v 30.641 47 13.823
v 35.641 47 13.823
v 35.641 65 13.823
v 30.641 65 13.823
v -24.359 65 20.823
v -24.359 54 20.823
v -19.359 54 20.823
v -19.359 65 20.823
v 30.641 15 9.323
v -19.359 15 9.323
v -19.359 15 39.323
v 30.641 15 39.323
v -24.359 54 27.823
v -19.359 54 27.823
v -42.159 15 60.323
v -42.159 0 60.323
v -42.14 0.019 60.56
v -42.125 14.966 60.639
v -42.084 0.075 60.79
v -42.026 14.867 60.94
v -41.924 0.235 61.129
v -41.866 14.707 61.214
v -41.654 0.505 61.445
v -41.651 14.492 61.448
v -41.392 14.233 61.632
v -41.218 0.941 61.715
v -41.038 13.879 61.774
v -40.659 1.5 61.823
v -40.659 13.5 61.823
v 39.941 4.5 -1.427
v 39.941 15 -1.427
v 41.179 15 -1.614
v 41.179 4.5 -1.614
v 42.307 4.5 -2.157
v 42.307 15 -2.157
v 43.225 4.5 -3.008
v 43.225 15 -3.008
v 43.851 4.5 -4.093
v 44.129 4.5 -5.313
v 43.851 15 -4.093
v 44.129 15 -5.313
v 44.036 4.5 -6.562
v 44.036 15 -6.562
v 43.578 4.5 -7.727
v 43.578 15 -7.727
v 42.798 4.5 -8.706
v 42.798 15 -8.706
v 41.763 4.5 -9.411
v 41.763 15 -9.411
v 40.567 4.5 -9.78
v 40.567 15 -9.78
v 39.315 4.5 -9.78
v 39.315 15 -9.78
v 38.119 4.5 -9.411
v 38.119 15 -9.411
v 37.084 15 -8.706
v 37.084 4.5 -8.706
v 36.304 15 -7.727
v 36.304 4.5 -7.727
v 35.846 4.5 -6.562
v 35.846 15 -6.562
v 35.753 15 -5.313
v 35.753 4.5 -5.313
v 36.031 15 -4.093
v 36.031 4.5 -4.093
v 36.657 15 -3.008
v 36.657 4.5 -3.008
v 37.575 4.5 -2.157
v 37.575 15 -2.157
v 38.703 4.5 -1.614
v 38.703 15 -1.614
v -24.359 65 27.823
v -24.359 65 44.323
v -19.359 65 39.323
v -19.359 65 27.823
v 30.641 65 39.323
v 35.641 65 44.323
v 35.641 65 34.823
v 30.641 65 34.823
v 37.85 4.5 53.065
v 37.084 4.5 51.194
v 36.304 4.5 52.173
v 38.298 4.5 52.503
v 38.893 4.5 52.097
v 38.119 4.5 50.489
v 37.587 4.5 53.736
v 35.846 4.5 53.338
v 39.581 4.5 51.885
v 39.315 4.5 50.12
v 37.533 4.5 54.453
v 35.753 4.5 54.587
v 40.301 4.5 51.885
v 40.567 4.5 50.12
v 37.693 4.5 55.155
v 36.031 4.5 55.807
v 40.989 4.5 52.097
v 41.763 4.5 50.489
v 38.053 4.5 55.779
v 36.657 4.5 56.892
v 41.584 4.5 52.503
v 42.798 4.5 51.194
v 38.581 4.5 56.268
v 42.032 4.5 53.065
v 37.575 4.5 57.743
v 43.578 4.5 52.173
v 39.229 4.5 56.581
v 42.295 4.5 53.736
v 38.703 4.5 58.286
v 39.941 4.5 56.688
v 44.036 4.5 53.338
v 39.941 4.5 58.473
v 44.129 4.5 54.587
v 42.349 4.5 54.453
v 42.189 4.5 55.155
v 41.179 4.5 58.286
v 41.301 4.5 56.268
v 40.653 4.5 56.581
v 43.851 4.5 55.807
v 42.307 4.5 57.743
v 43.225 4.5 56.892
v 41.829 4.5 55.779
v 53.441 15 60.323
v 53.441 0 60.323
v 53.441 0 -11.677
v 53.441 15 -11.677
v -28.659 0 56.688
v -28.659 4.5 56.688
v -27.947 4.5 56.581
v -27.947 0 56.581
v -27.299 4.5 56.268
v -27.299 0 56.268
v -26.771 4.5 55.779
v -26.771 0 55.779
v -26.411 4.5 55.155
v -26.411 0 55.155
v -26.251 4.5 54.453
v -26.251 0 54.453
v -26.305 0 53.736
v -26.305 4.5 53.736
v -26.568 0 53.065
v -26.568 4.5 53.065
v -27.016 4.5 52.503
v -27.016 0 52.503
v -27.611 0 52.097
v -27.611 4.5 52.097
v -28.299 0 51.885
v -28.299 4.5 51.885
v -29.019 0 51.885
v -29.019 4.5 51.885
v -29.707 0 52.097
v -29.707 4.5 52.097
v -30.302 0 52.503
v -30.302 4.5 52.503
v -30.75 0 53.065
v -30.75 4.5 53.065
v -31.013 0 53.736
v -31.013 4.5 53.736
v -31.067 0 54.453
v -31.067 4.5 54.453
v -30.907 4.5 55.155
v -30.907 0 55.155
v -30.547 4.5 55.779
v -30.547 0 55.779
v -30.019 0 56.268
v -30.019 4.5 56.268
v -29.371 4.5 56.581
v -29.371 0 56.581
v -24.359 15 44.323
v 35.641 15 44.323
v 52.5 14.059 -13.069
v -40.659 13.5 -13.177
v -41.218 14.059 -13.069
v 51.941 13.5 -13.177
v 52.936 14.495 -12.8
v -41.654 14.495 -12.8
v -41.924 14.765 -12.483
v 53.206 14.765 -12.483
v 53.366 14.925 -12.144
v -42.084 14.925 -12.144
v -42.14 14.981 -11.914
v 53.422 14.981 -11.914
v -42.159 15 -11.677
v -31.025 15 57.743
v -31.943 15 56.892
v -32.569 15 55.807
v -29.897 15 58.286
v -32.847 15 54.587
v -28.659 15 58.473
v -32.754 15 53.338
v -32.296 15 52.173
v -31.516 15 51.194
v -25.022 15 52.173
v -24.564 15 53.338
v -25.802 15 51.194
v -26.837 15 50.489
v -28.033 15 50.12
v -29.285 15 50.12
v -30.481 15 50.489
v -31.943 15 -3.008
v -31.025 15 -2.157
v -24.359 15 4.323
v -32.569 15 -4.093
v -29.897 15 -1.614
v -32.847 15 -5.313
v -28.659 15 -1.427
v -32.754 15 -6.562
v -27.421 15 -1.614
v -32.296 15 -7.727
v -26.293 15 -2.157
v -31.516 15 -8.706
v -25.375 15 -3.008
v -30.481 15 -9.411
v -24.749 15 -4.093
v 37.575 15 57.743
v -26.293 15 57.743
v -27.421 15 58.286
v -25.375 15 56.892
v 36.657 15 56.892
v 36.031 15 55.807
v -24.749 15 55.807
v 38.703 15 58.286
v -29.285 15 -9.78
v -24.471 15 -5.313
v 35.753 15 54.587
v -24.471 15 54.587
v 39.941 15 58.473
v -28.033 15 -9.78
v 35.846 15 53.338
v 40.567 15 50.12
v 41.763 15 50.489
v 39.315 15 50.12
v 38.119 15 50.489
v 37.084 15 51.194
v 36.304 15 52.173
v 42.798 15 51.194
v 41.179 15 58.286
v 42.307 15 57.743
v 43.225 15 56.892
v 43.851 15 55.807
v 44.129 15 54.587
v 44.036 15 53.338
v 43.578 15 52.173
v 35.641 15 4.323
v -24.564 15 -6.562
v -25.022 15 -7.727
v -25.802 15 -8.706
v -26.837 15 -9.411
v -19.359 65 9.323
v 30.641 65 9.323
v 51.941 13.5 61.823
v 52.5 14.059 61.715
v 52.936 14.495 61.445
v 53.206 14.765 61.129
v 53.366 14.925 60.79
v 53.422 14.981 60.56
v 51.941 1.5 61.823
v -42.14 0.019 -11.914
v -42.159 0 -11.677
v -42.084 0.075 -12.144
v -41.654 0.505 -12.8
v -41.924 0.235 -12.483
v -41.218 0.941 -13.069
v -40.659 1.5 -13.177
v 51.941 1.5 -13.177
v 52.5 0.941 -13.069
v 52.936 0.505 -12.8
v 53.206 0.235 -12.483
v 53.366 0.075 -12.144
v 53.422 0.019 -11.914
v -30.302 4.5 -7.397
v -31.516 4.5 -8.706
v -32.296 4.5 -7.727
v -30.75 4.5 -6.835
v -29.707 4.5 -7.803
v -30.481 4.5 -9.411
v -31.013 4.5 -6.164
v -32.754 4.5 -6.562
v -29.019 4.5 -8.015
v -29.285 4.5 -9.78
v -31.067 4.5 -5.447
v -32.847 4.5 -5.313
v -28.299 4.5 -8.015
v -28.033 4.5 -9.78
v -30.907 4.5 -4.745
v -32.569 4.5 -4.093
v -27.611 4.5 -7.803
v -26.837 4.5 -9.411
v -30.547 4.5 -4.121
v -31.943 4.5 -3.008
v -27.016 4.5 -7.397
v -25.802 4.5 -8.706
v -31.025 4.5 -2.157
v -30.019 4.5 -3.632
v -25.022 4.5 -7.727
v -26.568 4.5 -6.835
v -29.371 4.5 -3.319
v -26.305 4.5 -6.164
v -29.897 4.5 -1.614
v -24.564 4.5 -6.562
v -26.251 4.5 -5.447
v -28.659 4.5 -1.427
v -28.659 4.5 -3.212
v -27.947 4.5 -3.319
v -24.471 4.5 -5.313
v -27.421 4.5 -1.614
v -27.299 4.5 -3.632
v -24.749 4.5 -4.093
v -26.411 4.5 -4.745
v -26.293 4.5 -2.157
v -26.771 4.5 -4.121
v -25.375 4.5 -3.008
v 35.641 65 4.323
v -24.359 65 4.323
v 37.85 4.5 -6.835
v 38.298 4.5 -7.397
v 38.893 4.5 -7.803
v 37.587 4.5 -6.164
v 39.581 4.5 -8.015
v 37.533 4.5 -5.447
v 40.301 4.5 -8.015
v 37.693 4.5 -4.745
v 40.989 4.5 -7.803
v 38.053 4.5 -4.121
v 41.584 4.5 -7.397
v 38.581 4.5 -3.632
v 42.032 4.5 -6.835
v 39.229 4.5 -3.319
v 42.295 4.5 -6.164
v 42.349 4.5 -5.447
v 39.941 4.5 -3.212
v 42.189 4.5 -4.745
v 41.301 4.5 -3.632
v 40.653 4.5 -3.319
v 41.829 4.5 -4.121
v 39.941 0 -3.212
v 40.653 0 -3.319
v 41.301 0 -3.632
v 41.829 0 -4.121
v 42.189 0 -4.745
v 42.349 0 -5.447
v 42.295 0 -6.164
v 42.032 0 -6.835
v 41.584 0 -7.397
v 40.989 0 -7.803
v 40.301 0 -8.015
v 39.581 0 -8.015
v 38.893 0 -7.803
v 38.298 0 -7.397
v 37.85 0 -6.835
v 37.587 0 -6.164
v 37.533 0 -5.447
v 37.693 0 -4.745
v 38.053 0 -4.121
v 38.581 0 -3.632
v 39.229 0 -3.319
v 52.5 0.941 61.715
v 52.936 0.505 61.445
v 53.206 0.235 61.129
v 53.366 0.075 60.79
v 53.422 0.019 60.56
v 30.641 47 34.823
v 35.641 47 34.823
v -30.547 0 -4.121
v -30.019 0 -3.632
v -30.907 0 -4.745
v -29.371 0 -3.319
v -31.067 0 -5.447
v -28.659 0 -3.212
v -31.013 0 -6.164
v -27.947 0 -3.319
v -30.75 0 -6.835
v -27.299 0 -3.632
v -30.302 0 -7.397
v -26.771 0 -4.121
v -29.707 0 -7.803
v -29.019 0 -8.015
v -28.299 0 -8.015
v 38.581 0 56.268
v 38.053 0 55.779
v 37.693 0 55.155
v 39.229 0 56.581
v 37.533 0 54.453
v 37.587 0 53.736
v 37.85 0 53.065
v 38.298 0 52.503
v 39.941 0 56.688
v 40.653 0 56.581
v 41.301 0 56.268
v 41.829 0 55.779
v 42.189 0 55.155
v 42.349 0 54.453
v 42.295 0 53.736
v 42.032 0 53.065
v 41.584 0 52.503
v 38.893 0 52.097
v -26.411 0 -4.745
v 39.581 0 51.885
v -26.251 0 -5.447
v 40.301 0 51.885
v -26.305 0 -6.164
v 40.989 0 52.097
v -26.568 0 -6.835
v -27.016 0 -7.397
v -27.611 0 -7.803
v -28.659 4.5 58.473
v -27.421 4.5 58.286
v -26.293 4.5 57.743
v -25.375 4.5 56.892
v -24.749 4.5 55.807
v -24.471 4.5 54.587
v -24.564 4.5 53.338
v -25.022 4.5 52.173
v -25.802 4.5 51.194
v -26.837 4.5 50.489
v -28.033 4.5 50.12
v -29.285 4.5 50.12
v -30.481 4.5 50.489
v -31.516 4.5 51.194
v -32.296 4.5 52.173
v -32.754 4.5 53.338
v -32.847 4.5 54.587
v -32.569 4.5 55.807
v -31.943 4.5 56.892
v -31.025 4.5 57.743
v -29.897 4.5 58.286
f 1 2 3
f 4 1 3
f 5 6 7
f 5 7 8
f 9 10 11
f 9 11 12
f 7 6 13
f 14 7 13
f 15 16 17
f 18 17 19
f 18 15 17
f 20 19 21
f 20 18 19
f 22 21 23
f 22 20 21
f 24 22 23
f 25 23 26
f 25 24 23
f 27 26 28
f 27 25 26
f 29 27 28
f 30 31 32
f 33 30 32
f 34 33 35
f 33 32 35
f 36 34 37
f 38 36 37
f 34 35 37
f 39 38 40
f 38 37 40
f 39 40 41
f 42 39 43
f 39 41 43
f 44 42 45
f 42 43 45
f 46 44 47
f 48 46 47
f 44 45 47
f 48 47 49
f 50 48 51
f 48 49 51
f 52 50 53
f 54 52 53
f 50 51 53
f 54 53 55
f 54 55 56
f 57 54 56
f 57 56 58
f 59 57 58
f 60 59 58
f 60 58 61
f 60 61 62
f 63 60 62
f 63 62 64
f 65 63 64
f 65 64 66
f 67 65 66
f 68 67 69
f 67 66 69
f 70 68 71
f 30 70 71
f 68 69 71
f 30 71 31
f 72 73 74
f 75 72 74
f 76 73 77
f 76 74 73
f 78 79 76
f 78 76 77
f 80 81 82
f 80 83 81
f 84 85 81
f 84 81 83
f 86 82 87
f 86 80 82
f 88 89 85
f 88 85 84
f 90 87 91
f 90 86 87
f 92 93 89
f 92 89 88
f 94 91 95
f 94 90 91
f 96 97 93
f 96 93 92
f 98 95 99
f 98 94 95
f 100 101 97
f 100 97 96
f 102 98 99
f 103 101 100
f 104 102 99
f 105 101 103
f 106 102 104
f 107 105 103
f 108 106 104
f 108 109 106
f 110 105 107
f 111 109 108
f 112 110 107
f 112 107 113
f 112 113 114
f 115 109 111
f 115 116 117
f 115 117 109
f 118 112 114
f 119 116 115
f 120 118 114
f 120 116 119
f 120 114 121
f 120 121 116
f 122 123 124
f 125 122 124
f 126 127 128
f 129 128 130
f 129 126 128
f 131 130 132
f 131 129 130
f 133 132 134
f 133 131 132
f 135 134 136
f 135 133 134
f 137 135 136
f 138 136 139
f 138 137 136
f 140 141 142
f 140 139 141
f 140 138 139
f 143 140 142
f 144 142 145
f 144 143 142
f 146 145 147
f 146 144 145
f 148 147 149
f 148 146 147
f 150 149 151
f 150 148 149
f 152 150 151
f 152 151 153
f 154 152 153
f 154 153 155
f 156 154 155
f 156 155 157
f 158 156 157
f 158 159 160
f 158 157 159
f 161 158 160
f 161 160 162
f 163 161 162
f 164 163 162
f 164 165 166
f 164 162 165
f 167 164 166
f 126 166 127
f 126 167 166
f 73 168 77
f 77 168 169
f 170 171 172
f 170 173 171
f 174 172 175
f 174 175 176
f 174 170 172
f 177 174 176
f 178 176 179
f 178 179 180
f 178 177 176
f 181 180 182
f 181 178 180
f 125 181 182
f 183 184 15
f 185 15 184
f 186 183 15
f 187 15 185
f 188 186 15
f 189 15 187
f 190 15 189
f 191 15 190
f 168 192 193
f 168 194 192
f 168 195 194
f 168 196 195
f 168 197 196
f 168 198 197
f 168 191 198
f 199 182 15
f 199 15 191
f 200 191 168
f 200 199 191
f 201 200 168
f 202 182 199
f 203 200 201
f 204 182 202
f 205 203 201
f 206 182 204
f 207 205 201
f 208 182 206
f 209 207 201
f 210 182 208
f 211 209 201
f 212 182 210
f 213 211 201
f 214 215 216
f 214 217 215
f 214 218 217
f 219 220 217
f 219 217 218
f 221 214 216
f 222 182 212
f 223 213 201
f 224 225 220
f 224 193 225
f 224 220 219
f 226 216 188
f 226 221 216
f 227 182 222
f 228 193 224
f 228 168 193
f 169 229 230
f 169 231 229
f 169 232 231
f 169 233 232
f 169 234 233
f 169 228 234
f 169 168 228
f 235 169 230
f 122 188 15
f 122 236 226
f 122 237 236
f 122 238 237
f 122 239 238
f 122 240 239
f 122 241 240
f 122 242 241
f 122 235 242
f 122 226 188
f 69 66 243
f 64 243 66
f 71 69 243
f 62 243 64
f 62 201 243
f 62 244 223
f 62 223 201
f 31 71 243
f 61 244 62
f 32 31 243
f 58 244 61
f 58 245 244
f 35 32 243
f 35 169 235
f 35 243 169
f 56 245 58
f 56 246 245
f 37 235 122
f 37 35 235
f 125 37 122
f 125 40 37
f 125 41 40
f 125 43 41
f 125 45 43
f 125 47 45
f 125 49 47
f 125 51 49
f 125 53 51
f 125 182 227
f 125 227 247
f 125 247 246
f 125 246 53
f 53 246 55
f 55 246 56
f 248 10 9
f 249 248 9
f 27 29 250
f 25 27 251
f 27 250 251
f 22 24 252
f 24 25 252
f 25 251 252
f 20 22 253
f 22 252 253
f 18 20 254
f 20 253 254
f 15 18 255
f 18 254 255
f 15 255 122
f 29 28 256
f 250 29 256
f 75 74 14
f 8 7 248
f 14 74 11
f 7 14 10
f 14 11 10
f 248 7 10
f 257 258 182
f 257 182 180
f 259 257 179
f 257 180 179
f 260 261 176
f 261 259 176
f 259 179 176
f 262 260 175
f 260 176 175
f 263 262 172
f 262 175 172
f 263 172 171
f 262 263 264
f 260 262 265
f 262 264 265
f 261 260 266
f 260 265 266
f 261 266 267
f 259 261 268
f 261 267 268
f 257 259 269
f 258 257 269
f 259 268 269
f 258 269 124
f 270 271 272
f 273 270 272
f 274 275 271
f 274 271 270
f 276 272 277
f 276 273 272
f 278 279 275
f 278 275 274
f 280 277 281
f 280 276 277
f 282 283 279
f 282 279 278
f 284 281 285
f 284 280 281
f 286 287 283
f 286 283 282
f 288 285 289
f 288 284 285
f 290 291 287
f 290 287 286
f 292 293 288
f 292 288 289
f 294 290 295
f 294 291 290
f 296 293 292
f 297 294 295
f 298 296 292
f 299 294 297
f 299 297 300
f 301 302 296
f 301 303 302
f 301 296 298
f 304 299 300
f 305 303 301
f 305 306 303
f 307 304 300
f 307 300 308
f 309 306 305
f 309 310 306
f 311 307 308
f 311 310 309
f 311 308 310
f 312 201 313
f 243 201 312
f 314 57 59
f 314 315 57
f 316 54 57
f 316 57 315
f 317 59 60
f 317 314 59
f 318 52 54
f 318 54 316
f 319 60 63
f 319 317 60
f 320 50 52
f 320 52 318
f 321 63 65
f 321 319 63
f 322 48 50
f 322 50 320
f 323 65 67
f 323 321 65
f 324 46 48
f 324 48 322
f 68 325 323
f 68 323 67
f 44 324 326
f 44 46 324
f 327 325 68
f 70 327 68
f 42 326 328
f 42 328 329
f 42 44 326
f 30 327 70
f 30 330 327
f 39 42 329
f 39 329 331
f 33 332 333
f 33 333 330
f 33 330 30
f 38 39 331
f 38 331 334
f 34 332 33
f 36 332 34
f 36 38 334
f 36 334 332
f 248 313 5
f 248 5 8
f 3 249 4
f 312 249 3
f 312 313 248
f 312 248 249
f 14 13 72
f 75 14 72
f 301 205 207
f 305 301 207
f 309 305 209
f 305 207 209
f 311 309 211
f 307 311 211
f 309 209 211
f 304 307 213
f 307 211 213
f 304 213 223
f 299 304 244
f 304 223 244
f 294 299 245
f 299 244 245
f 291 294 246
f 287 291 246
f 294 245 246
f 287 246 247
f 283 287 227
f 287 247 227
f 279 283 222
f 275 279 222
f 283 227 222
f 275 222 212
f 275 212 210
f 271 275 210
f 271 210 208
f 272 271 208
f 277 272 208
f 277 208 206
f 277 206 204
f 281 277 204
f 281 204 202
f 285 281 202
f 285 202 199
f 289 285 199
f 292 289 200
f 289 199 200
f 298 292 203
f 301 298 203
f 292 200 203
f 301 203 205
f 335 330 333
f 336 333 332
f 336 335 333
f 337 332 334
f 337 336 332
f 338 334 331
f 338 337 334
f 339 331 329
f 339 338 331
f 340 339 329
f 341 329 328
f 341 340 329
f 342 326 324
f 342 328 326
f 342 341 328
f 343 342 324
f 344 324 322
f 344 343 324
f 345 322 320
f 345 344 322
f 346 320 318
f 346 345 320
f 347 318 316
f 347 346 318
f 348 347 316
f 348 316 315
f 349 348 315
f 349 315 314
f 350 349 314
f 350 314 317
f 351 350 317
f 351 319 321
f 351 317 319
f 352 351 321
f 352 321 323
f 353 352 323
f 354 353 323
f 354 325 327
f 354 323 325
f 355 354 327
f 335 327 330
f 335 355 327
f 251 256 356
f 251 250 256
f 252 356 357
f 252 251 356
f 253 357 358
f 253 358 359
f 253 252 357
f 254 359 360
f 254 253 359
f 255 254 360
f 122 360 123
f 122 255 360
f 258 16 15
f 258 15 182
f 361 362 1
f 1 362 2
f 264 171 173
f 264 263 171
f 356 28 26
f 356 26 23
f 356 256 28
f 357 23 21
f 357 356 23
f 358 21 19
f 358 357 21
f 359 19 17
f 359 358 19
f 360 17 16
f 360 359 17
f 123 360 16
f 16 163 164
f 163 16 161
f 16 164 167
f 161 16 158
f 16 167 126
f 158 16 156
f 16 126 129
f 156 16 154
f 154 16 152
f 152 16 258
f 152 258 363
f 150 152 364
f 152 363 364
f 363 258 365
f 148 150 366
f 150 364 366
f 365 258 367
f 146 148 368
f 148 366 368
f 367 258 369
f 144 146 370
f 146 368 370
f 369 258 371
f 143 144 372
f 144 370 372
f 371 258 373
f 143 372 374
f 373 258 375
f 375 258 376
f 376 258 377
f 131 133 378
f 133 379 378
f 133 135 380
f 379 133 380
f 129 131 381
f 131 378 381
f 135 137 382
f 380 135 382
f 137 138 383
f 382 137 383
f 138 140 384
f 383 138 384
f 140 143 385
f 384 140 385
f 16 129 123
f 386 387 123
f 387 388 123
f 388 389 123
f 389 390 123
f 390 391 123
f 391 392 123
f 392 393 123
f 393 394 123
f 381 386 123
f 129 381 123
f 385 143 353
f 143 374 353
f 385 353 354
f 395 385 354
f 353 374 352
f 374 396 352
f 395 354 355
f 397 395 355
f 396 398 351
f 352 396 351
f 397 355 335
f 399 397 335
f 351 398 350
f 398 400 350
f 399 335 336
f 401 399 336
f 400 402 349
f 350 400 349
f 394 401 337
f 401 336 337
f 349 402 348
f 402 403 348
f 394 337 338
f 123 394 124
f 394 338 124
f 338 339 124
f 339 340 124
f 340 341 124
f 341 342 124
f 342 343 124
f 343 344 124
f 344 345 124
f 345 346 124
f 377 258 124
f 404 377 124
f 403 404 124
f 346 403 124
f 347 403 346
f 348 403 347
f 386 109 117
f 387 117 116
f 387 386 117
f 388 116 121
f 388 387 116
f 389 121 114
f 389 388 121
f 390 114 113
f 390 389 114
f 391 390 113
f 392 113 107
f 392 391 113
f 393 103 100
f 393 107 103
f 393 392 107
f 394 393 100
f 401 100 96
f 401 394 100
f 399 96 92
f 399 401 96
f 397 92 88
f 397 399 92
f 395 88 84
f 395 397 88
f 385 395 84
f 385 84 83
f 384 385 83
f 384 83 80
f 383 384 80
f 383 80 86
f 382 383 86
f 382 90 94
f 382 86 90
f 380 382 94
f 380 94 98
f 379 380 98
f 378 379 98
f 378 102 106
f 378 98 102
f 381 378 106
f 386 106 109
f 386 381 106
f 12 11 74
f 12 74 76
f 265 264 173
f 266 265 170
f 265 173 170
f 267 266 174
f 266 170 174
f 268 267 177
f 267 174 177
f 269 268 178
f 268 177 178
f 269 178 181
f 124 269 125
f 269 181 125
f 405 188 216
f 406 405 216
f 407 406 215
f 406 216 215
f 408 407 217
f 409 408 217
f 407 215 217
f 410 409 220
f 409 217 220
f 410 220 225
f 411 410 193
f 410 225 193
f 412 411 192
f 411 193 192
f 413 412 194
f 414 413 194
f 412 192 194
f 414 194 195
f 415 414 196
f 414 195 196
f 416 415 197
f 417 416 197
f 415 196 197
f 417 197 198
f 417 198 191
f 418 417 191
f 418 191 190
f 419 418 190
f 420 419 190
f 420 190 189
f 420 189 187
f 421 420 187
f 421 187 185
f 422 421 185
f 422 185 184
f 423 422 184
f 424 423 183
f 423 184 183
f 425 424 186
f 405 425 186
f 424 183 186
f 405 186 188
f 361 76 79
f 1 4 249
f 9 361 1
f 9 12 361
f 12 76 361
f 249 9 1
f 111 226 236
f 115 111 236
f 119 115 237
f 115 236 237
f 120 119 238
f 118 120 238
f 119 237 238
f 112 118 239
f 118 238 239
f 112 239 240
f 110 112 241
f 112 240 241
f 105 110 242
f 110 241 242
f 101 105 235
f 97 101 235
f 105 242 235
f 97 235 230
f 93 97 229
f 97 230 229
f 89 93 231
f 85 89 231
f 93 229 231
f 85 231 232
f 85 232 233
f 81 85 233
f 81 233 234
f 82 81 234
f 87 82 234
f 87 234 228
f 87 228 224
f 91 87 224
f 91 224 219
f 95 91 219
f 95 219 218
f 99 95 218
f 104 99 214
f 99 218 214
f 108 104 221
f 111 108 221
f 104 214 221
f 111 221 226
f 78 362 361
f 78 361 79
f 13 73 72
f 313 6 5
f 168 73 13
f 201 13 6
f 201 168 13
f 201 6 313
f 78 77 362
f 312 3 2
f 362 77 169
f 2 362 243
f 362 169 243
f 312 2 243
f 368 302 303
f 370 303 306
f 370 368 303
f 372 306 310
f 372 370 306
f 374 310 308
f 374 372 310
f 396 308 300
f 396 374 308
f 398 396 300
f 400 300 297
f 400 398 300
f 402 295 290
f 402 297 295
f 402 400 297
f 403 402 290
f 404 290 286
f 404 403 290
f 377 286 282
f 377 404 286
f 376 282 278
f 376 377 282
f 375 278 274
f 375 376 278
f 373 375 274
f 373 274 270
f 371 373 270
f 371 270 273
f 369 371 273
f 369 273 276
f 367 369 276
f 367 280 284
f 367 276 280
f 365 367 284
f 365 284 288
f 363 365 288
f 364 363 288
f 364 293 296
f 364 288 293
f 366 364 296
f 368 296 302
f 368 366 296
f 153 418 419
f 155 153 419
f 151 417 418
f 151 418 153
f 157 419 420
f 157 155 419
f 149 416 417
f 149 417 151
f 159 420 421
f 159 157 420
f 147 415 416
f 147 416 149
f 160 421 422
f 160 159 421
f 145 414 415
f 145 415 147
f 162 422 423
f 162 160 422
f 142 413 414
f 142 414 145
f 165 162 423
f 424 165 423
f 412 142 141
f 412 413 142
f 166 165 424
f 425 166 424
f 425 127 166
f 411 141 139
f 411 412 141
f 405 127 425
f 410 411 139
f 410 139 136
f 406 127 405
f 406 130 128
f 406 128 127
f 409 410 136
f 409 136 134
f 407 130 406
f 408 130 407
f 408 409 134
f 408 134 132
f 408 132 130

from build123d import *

# Parameters (mm, degrees)
SKETCH_1_W          = 95.6
SKETCH_1_H          = 75
SKETCH_1_R          = 2.415
EXTRUDE_1_DEPTH     = 15
FILLET_1_R          = 1.5
SKETCH_2_W          = 60
SKETCH_2_H          = 40
SKETCH_2_W_2        = 50
SKETCH_2_H_2        = 30
EXTRUDE_2_DEPTH     = 50
SKETCH_3_R          = 4.2
CUT_EXTRUDE_1_DEPTH = 10.5
SKETCH_5_W          = 21
SKETCH_5_H          = 18
CUT_EXTRUDE_2_DEPTH = 5
SKETCH_6_W          = 7
SKETCH_6_H          = 11
CUT_EXTRUDE_3_DEPTH = 5


with BuildPart() as part:
    # 草圖1 → 填料-伸長1 (new body)
    with BuildSketch(Plane(origin=(0, 0, 0), x_dir=(1, 0, 0), z_dir=(0, 1, 0))):
        with Locations((5.640991766, -24.322966942)):
            Rectangle(SKETCH_1_W, SKETCH_1_H)
        with Locations(Location((-28.659008234, -54.272966942, 0), (0, 0, 270))):
            Circle(SKETCH_1_R, mode=Mode.SUBTRACT)
        with Locations(Location((-28.659008234, 5.627033058, 0), (0, 0, 270))):
            Circle(SKETCH_1_R, mode=Mode.SUBTRACT)
        with Locations(Location((39.940991766, 5.627033058, 0), (0, 0, 270))):
            Circle(SKETCH_1_R, mode=Mode.SUBTRACT)
        with Locations(Location((39.940991766, -54.272966942, 0), (0, 0, 270))):
            Circle(SKETCH_1_R, mode=Mode.SUBTRACT)
    extrude(amount=EXTRUDE_1_DEPTH)

    # 圓角1
    fillet_1_edges = [part.edges().sort_by_distance(p)[0] for p in [
        (5.640991766, 15, -13.177033058),
        (5.640991766, 0, -13.177033058),
        (5.640991766, 0, 61.822966942),
        (-42.159008234, 7.5, -13.177033058),
        (53.440991766, 7.5, -13.177033058),
        (53.440991766, 7.5, 61.822966942),
        (-42.159008234, 7.5, 61.822966942),
        (5.640991766, 15, 61.822966942),
    ]]
    fillet(fillet_1_edges, radius=FILLET_1_R)

    # 草圖2 → 填料-伸長2 (add)
    with BuildSketch(Plane(origin=(0, 15, 0), x_dir=(1, 0, 0), z_dir=(0, 1, 0))):
        with Locations((5.640991766, -24.322966942)):
            Rectangle(SKETCH_2_W, SKETCH_2_H)
        with Locations((5.640991766, -24.322966942)):
            Rectangle(SKETCH_2_W_2, SKETCH_2_H_2, mode=Mode.SUBTRACT)
    extrude(amount=EXTRUDE_2_DEPTH)

    # 草圖3 → 除料-伸長1 (cut)
    with BuildSketch(Plane(origin=(0, 15, 0), x_dir=(1, 0, 0), z_dir=(0, 1, 0))):
        with Locations(Location((-28.659008234, 5.627033058, 0), (0, 0, 270))):
            Circle(SKETCH_3_R)
        with Locations(Location((39.940991766, 5.627033058, 0), (0, 0, 270))):
            Circle(SKETCH_3_R)
        with Locations(Location((39.940991766, -54.272966942, 0), (0, 0, 270))):
            Circle(SKETCH_3_R)
        with Locations(Location((-28.659008234, -54.272966942, 0), (0, 0, 270))):
            Circle(SKETCH_3_R)
    extrude(amount=-CUT_EXTRUDE_1_DEPTH, mode=Mode.SUBTRACT)

    # 草圖5 → 除料-伸長2 (cut)
    with BuildSketch(Plane(origin=(35.640991766, 0, 0), x_dir=(0, 0, -1), z_dir=(1, 0, 0))):
        with Locations((-24.322966942, 56)):
            Rectangle(SKETCH_5_W, SKETCH_5_H)
    extrude(amount=-CUT_EXTRUDE_2_DEPTH, mode=Mode.SUBTRACT)

    # 草圖6 → 除料-伸長3 (cut)
    with BuildSketch(Plane.ZY.offset(24.359008234)):
        with Locations((24.322966942, 59.5)):
            Rectangle(SKETCH_6_W, SKETCH_6_H)
    extrude(amount=-CUT_EXTRUDE_3_DEPTH, mode=Mode.SUBTRACT)


solid = part.part
